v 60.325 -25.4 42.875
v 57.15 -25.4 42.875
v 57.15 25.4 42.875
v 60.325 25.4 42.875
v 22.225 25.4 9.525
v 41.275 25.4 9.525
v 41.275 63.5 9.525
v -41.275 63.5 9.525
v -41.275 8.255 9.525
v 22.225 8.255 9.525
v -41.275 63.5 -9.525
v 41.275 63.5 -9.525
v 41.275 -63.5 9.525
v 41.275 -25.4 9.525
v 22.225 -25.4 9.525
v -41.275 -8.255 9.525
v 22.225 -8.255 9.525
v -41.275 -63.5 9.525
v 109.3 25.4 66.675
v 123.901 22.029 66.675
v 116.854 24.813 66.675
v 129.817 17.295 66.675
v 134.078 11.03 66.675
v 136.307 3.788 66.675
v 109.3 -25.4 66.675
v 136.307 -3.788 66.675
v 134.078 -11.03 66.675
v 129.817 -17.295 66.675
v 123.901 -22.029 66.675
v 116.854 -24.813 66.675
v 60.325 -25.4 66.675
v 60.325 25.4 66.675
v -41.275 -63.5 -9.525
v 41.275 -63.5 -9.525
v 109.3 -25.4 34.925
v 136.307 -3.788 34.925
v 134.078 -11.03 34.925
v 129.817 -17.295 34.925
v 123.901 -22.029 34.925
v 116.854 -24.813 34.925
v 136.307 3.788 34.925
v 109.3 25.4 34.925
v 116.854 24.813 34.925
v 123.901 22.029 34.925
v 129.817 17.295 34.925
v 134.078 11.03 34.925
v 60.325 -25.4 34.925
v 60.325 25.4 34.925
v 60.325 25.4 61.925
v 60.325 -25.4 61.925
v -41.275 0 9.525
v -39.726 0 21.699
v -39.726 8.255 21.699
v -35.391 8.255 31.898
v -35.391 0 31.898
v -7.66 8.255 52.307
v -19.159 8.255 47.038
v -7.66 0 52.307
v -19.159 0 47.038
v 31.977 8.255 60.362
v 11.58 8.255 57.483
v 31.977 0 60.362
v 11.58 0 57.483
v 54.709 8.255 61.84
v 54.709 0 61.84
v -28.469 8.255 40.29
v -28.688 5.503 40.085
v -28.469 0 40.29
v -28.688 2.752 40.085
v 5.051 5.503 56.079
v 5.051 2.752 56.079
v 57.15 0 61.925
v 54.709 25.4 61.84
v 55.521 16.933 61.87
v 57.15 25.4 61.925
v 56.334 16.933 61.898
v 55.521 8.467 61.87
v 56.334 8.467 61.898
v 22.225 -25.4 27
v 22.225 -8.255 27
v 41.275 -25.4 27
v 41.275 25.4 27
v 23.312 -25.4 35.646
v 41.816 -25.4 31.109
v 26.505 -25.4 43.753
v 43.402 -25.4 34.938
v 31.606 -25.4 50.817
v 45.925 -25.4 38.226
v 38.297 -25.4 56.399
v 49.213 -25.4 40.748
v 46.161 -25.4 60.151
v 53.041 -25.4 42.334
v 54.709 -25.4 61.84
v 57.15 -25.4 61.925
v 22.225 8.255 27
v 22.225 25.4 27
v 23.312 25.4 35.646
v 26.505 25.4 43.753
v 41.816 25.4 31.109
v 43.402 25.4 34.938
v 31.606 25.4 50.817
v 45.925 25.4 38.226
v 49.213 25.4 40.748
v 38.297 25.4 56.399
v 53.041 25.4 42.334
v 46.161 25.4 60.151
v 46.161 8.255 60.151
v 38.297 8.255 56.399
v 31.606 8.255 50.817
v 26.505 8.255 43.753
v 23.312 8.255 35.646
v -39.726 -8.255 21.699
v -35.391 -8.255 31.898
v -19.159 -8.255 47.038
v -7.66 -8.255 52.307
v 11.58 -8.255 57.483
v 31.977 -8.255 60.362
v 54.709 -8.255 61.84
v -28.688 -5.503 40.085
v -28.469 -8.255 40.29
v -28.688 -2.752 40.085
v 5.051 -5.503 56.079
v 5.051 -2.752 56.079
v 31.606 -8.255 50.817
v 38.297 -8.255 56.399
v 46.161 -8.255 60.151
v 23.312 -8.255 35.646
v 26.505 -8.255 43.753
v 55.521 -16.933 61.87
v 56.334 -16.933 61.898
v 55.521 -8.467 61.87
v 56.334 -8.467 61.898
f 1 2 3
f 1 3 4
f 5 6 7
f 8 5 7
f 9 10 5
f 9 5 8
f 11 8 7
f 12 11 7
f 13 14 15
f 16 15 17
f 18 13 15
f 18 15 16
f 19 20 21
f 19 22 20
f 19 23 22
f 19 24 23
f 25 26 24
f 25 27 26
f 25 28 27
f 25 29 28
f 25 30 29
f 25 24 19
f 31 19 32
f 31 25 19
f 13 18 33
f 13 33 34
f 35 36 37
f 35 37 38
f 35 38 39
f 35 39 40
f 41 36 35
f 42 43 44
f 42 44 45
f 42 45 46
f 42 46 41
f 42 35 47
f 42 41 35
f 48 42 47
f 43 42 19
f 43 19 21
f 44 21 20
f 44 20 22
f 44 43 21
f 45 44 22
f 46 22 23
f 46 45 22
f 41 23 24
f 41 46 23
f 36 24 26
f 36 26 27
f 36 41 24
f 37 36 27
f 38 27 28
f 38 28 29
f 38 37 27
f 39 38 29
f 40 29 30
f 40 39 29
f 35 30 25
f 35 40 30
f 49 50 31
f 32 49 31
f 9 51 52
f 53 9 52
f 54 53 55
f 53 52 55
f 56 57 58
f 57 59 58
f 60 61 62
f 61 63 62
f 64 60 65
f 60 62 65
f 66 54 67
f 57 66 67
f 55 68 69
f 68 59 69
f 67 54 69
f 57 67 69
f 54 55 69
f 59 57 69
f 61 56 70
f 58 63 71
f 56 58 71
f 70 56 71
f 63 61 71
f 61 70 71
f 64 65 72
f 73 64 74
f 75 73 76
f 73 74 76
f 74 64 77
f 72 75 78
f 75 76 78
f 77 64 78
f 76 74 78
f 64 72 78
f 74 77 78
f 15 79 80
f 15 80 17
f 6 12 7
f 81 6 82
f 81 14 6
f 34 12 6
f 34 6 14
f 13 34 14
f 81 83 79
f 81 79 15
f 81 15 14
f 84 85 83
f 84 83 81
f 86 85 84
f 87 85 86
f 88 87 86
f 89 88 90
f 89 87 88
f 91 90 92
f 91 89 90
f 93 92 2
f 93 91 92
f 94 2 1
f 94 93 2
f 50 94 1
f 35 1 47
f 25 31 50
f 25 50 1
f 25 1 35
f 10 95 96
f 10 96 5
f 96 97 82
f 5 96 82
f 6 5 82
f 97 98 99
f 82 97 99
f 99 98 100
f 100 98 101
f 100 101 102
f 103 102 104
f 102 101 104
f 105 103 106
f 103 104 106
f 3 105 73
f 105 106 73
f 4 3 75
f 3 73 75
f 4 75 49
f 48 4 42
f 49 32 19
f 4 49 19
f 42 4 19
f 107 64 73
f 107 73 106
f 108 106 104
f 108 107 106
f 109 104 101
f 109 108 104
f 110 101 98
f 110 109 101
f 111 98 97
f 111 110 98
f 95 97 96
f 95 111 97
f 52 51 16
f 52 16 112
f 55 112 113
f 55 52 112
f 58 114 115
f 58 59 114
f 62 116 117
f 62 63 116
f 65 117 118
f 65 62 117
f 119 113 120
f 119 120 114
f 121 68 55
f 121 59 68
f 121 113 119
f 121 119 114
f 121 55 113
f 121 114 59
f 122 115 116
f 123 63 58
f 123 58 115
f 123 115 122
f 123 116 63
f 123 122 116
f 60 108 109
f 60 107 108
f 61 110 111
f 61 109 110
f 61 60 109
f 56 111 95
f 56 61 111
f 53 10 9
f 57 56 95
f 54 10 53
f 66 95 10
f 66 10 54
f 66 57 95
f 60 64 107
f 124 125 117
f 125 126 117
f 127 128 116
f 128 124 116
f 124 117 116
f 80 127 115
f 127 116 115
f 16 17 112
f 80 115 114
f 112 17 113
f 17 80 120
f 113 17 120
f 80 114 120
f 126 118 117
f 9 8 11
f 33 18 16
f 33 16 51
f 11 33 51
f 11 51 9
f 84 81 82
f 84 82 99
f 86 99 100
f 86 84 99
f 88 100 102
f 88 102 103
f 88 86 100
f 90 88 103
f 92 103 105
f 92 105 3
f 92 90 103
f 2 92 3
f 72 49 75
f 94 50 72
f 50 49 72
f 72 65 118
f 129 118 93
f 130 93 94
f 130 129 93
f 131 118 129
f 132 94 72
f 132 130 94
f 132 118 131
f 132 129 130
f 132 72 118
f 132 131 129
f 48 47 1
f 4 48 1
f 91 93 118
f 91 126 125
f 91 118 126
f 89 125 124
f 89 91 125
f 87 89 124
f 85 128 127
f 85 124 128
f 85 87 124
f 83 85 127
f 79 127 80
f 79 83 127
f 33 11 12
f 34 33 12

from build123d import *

# Parameters (mm, degrees)
F1_DEPTH = 63.5
F0_W     = 25.3345113873
F0_H     = 19.05
F0_H_2   = 7.9502
F0_H_3   = 4.7498
F2_DEPTH = 25.4
F3_DEPTH = 8.255


with BuildPart() as f1:
    # F0 (on Front) → F1 (new body, symmetric)
    with BuildSketch(Plane.XZ):
        Polygon((22.225, 9.525), (-41.275, 9.525), (-41.275, -9.525), (41.275, -9.525), (41.275, 9.525), align=None)
    extrude(amount=F1_DEPTH, both=True)

    # F0 (on Front) → F2 (join, symmetric)
    with BuildSketch(Plane.XZ):
        with BuildLine():
            Line((22.225, 27.0002), (22.225, 9.525))
            Line((22.225, 9.525), (41.275, 9.525))
            Line((41.275, 9.525), (41.275, 27.0002))
            ThreePointArc((41.275, 27.0002), (45.9246798487, 38.2255201513), (57.15, 42.8752))
            Line((57.15, 42.8752), (60.325, 42.8752))
            Line((60.325, 42.8752), (60.325, 61.9252))
            Line((60.325, 61.9252), (57.15, 61.9252))
            add(Edge.make_bspline(
                [(54.7094854303, 61.8398256242), (55.5196441787, 61.8701239826), (56.3331729653, 61.8985622867), (57.15, 61.9252)],
                knots=[109.9108367824, 109.9108367824, 109.9108367824, 109.9108367824, 111.5045361635, 111.5045361635, 111.5045361635, 111.5045361635], degree=3))
            ThreePointArc((54.7094854303, 61.8398256242), (31.6060124849, 50.8174275218), (22.225, 27.0002))
        make_face()
        with Locations((72.9922556937, 52.4002)):
            Rectangle(F0_W, F0_H)
        Polygon((85.6595113873, 66.675), (85.6595113873, 61.9252), (85.6595113873, 42.8752), (85.6595113873, 34.925), (111.125, 34.925), (111.125, 66.675), align=None)
        with Locations((72.9922556937, 38.9001)):
            Rectangle(F0_W, F0_H_2)
        with Locations((72.9922556937, 64.3001)):
            Rectangle(F0_W, F0_H_3)
    extrude(amount=F2_DEPTH, both=True)

    # F0 (on Front) → F3 (join, symmetric)
    with BuildSketch(Plane.XZ):
        with BuildLine():
            add(Edge.make_bspline(
                [(-41.275, 9.525), (-41.0082168827, 48.8137659642), (-1.1638034837, 59.7502735026), (54.7094854303, 61.8398256242)],
                knots=[0, 0, 0, 0, 109.9108367824, 109.9108367824, 109.9108367824, 109.9108367824], degree=3))
            Line((-41.275, 9.525), (22.225, 9.525))
            Line((22.225, 9.525), (22.225, 27.0002))
            ThreePointArc((22.225, 27.0002), (31.6060124849, 50.8174275218), (54.7094854303, 61.8398256242))
        make_face()
    extrude(amount=F3_DEPTH, both=True)

    # F0 (on Front) → F4 (revolve)
    with BuildSketch(Plane.XZ):
        Polygon((85.6595113873, 66.675), (85.6595113873, 61.9252), (85.6595113873, 42.8752), (85.6595113873, 34.925), (111.125, 34.925), (111.125, 66.675), align=None)
    revolve(axis=Axis((111.125, 0, 50.8), (0, 0, -1)))


solid = f1.part
